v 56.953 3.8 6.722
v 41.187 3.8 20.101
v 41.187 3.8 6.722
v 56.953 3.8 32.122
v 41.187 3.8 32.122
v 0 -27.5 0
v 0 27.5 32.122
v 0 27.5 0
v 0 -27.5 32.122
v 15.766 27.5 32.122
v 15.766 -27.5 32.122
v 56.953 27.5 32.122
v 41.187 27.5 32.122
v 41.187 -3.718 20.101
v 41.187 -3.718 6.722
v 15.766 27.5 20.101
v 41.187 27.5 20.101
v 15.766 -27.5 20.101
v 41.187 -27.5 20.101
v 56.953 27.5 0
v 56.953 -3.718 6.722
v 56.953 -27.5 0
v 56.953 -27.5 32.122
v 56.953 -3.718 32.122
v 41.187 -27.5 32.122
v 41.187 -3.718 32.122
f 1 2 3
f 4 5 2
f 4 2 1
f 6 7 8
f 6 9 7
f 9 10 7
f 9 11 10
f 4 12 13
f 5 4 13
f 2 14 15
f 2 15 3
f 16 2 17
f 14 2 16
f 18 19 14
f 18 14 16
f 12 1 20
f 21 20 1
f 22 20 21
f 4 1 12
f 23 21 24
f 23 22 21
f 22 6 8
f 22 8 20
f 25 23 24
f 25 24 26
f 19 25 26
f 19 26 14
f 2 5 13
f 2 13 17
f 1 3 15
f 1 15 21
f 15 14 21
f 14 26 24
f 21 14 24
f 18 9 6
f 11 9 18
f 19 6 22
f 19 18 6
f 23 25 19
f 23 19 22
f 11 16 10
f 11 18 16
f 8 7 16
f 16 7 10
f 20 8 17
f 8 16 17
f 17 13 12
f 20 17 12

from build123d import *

# Parameters (mm, degrees)
F0_R     = 9.4158486149
F1_DEPTH = 25.4
F4_DEPTH = 27.5
F5_W     = 15.7655179501
F5_H     = 7.5176365208
F6_DEPTH = 25.4


with BuildPart() as f1:
    # F0 (on Front) → F1 (new body)
    with BuildSketch(Plane.XZ):
        with BuildLine():
            Line((-26.7482474446, -27.6464950293), (26.7482474446, -27.6464950293))
            Line((26.7482474446, -27.6464950293), (26.7482474446, 27.6464950293))
            ThreePointArc((26.7482474446, 27.6464950293), (0, 0.8982475847), (-26.7482474446, 27.6464950293))
            Line((-26.7482474446, 27.6464950293), (-26.7482474446, -27.6464950293))
        make_face()
        with BuildLine():
            ThreePointArc((-26.7482474446, 27.6464950293), (0, 0.8982475847), (26.7482474446, 27.6464950293))
            ThreePointArc((26.7482474446, 27.6464950293), (0, 54.394742474), (-26.7482474446, 27.6464950293))
        make_face()
        with Locations((0, 27.6464950293)):
            Circle(F0_R, mode=Mode.SUBTRACT)
    extrude(amount=F1_DEPTH)


with BuildPart() as f4:
    # F3 (on Front) → F4 (new body, symmetric)
    with BuildSketch(Plane.XZ):
        Polygon((0, 32.1222431958), (0, 0), (56.9529347122, 0), (56.9529347122, 32.1222431958), (41.1874167621, 32.1222431958), (41.1874167621, 20.1010350138), (15.7655179501, 20.1010350138), (15.7655179501, 32.1222431958), align=None)
    extrude(amount=F4_DEPTH, both=True)

    # F5 (on face) → F6 (cut)
    with BuildSketch(Plane.XY.offset(32.1222431958)):
        with Locations((49.0701757371, 0.0409217319)):
            Rectangle(F5_W, F5_H)
    extrude(amount=-F6_DEPTH, mode=Mode.SUBTRACT)


solid = f4.part
